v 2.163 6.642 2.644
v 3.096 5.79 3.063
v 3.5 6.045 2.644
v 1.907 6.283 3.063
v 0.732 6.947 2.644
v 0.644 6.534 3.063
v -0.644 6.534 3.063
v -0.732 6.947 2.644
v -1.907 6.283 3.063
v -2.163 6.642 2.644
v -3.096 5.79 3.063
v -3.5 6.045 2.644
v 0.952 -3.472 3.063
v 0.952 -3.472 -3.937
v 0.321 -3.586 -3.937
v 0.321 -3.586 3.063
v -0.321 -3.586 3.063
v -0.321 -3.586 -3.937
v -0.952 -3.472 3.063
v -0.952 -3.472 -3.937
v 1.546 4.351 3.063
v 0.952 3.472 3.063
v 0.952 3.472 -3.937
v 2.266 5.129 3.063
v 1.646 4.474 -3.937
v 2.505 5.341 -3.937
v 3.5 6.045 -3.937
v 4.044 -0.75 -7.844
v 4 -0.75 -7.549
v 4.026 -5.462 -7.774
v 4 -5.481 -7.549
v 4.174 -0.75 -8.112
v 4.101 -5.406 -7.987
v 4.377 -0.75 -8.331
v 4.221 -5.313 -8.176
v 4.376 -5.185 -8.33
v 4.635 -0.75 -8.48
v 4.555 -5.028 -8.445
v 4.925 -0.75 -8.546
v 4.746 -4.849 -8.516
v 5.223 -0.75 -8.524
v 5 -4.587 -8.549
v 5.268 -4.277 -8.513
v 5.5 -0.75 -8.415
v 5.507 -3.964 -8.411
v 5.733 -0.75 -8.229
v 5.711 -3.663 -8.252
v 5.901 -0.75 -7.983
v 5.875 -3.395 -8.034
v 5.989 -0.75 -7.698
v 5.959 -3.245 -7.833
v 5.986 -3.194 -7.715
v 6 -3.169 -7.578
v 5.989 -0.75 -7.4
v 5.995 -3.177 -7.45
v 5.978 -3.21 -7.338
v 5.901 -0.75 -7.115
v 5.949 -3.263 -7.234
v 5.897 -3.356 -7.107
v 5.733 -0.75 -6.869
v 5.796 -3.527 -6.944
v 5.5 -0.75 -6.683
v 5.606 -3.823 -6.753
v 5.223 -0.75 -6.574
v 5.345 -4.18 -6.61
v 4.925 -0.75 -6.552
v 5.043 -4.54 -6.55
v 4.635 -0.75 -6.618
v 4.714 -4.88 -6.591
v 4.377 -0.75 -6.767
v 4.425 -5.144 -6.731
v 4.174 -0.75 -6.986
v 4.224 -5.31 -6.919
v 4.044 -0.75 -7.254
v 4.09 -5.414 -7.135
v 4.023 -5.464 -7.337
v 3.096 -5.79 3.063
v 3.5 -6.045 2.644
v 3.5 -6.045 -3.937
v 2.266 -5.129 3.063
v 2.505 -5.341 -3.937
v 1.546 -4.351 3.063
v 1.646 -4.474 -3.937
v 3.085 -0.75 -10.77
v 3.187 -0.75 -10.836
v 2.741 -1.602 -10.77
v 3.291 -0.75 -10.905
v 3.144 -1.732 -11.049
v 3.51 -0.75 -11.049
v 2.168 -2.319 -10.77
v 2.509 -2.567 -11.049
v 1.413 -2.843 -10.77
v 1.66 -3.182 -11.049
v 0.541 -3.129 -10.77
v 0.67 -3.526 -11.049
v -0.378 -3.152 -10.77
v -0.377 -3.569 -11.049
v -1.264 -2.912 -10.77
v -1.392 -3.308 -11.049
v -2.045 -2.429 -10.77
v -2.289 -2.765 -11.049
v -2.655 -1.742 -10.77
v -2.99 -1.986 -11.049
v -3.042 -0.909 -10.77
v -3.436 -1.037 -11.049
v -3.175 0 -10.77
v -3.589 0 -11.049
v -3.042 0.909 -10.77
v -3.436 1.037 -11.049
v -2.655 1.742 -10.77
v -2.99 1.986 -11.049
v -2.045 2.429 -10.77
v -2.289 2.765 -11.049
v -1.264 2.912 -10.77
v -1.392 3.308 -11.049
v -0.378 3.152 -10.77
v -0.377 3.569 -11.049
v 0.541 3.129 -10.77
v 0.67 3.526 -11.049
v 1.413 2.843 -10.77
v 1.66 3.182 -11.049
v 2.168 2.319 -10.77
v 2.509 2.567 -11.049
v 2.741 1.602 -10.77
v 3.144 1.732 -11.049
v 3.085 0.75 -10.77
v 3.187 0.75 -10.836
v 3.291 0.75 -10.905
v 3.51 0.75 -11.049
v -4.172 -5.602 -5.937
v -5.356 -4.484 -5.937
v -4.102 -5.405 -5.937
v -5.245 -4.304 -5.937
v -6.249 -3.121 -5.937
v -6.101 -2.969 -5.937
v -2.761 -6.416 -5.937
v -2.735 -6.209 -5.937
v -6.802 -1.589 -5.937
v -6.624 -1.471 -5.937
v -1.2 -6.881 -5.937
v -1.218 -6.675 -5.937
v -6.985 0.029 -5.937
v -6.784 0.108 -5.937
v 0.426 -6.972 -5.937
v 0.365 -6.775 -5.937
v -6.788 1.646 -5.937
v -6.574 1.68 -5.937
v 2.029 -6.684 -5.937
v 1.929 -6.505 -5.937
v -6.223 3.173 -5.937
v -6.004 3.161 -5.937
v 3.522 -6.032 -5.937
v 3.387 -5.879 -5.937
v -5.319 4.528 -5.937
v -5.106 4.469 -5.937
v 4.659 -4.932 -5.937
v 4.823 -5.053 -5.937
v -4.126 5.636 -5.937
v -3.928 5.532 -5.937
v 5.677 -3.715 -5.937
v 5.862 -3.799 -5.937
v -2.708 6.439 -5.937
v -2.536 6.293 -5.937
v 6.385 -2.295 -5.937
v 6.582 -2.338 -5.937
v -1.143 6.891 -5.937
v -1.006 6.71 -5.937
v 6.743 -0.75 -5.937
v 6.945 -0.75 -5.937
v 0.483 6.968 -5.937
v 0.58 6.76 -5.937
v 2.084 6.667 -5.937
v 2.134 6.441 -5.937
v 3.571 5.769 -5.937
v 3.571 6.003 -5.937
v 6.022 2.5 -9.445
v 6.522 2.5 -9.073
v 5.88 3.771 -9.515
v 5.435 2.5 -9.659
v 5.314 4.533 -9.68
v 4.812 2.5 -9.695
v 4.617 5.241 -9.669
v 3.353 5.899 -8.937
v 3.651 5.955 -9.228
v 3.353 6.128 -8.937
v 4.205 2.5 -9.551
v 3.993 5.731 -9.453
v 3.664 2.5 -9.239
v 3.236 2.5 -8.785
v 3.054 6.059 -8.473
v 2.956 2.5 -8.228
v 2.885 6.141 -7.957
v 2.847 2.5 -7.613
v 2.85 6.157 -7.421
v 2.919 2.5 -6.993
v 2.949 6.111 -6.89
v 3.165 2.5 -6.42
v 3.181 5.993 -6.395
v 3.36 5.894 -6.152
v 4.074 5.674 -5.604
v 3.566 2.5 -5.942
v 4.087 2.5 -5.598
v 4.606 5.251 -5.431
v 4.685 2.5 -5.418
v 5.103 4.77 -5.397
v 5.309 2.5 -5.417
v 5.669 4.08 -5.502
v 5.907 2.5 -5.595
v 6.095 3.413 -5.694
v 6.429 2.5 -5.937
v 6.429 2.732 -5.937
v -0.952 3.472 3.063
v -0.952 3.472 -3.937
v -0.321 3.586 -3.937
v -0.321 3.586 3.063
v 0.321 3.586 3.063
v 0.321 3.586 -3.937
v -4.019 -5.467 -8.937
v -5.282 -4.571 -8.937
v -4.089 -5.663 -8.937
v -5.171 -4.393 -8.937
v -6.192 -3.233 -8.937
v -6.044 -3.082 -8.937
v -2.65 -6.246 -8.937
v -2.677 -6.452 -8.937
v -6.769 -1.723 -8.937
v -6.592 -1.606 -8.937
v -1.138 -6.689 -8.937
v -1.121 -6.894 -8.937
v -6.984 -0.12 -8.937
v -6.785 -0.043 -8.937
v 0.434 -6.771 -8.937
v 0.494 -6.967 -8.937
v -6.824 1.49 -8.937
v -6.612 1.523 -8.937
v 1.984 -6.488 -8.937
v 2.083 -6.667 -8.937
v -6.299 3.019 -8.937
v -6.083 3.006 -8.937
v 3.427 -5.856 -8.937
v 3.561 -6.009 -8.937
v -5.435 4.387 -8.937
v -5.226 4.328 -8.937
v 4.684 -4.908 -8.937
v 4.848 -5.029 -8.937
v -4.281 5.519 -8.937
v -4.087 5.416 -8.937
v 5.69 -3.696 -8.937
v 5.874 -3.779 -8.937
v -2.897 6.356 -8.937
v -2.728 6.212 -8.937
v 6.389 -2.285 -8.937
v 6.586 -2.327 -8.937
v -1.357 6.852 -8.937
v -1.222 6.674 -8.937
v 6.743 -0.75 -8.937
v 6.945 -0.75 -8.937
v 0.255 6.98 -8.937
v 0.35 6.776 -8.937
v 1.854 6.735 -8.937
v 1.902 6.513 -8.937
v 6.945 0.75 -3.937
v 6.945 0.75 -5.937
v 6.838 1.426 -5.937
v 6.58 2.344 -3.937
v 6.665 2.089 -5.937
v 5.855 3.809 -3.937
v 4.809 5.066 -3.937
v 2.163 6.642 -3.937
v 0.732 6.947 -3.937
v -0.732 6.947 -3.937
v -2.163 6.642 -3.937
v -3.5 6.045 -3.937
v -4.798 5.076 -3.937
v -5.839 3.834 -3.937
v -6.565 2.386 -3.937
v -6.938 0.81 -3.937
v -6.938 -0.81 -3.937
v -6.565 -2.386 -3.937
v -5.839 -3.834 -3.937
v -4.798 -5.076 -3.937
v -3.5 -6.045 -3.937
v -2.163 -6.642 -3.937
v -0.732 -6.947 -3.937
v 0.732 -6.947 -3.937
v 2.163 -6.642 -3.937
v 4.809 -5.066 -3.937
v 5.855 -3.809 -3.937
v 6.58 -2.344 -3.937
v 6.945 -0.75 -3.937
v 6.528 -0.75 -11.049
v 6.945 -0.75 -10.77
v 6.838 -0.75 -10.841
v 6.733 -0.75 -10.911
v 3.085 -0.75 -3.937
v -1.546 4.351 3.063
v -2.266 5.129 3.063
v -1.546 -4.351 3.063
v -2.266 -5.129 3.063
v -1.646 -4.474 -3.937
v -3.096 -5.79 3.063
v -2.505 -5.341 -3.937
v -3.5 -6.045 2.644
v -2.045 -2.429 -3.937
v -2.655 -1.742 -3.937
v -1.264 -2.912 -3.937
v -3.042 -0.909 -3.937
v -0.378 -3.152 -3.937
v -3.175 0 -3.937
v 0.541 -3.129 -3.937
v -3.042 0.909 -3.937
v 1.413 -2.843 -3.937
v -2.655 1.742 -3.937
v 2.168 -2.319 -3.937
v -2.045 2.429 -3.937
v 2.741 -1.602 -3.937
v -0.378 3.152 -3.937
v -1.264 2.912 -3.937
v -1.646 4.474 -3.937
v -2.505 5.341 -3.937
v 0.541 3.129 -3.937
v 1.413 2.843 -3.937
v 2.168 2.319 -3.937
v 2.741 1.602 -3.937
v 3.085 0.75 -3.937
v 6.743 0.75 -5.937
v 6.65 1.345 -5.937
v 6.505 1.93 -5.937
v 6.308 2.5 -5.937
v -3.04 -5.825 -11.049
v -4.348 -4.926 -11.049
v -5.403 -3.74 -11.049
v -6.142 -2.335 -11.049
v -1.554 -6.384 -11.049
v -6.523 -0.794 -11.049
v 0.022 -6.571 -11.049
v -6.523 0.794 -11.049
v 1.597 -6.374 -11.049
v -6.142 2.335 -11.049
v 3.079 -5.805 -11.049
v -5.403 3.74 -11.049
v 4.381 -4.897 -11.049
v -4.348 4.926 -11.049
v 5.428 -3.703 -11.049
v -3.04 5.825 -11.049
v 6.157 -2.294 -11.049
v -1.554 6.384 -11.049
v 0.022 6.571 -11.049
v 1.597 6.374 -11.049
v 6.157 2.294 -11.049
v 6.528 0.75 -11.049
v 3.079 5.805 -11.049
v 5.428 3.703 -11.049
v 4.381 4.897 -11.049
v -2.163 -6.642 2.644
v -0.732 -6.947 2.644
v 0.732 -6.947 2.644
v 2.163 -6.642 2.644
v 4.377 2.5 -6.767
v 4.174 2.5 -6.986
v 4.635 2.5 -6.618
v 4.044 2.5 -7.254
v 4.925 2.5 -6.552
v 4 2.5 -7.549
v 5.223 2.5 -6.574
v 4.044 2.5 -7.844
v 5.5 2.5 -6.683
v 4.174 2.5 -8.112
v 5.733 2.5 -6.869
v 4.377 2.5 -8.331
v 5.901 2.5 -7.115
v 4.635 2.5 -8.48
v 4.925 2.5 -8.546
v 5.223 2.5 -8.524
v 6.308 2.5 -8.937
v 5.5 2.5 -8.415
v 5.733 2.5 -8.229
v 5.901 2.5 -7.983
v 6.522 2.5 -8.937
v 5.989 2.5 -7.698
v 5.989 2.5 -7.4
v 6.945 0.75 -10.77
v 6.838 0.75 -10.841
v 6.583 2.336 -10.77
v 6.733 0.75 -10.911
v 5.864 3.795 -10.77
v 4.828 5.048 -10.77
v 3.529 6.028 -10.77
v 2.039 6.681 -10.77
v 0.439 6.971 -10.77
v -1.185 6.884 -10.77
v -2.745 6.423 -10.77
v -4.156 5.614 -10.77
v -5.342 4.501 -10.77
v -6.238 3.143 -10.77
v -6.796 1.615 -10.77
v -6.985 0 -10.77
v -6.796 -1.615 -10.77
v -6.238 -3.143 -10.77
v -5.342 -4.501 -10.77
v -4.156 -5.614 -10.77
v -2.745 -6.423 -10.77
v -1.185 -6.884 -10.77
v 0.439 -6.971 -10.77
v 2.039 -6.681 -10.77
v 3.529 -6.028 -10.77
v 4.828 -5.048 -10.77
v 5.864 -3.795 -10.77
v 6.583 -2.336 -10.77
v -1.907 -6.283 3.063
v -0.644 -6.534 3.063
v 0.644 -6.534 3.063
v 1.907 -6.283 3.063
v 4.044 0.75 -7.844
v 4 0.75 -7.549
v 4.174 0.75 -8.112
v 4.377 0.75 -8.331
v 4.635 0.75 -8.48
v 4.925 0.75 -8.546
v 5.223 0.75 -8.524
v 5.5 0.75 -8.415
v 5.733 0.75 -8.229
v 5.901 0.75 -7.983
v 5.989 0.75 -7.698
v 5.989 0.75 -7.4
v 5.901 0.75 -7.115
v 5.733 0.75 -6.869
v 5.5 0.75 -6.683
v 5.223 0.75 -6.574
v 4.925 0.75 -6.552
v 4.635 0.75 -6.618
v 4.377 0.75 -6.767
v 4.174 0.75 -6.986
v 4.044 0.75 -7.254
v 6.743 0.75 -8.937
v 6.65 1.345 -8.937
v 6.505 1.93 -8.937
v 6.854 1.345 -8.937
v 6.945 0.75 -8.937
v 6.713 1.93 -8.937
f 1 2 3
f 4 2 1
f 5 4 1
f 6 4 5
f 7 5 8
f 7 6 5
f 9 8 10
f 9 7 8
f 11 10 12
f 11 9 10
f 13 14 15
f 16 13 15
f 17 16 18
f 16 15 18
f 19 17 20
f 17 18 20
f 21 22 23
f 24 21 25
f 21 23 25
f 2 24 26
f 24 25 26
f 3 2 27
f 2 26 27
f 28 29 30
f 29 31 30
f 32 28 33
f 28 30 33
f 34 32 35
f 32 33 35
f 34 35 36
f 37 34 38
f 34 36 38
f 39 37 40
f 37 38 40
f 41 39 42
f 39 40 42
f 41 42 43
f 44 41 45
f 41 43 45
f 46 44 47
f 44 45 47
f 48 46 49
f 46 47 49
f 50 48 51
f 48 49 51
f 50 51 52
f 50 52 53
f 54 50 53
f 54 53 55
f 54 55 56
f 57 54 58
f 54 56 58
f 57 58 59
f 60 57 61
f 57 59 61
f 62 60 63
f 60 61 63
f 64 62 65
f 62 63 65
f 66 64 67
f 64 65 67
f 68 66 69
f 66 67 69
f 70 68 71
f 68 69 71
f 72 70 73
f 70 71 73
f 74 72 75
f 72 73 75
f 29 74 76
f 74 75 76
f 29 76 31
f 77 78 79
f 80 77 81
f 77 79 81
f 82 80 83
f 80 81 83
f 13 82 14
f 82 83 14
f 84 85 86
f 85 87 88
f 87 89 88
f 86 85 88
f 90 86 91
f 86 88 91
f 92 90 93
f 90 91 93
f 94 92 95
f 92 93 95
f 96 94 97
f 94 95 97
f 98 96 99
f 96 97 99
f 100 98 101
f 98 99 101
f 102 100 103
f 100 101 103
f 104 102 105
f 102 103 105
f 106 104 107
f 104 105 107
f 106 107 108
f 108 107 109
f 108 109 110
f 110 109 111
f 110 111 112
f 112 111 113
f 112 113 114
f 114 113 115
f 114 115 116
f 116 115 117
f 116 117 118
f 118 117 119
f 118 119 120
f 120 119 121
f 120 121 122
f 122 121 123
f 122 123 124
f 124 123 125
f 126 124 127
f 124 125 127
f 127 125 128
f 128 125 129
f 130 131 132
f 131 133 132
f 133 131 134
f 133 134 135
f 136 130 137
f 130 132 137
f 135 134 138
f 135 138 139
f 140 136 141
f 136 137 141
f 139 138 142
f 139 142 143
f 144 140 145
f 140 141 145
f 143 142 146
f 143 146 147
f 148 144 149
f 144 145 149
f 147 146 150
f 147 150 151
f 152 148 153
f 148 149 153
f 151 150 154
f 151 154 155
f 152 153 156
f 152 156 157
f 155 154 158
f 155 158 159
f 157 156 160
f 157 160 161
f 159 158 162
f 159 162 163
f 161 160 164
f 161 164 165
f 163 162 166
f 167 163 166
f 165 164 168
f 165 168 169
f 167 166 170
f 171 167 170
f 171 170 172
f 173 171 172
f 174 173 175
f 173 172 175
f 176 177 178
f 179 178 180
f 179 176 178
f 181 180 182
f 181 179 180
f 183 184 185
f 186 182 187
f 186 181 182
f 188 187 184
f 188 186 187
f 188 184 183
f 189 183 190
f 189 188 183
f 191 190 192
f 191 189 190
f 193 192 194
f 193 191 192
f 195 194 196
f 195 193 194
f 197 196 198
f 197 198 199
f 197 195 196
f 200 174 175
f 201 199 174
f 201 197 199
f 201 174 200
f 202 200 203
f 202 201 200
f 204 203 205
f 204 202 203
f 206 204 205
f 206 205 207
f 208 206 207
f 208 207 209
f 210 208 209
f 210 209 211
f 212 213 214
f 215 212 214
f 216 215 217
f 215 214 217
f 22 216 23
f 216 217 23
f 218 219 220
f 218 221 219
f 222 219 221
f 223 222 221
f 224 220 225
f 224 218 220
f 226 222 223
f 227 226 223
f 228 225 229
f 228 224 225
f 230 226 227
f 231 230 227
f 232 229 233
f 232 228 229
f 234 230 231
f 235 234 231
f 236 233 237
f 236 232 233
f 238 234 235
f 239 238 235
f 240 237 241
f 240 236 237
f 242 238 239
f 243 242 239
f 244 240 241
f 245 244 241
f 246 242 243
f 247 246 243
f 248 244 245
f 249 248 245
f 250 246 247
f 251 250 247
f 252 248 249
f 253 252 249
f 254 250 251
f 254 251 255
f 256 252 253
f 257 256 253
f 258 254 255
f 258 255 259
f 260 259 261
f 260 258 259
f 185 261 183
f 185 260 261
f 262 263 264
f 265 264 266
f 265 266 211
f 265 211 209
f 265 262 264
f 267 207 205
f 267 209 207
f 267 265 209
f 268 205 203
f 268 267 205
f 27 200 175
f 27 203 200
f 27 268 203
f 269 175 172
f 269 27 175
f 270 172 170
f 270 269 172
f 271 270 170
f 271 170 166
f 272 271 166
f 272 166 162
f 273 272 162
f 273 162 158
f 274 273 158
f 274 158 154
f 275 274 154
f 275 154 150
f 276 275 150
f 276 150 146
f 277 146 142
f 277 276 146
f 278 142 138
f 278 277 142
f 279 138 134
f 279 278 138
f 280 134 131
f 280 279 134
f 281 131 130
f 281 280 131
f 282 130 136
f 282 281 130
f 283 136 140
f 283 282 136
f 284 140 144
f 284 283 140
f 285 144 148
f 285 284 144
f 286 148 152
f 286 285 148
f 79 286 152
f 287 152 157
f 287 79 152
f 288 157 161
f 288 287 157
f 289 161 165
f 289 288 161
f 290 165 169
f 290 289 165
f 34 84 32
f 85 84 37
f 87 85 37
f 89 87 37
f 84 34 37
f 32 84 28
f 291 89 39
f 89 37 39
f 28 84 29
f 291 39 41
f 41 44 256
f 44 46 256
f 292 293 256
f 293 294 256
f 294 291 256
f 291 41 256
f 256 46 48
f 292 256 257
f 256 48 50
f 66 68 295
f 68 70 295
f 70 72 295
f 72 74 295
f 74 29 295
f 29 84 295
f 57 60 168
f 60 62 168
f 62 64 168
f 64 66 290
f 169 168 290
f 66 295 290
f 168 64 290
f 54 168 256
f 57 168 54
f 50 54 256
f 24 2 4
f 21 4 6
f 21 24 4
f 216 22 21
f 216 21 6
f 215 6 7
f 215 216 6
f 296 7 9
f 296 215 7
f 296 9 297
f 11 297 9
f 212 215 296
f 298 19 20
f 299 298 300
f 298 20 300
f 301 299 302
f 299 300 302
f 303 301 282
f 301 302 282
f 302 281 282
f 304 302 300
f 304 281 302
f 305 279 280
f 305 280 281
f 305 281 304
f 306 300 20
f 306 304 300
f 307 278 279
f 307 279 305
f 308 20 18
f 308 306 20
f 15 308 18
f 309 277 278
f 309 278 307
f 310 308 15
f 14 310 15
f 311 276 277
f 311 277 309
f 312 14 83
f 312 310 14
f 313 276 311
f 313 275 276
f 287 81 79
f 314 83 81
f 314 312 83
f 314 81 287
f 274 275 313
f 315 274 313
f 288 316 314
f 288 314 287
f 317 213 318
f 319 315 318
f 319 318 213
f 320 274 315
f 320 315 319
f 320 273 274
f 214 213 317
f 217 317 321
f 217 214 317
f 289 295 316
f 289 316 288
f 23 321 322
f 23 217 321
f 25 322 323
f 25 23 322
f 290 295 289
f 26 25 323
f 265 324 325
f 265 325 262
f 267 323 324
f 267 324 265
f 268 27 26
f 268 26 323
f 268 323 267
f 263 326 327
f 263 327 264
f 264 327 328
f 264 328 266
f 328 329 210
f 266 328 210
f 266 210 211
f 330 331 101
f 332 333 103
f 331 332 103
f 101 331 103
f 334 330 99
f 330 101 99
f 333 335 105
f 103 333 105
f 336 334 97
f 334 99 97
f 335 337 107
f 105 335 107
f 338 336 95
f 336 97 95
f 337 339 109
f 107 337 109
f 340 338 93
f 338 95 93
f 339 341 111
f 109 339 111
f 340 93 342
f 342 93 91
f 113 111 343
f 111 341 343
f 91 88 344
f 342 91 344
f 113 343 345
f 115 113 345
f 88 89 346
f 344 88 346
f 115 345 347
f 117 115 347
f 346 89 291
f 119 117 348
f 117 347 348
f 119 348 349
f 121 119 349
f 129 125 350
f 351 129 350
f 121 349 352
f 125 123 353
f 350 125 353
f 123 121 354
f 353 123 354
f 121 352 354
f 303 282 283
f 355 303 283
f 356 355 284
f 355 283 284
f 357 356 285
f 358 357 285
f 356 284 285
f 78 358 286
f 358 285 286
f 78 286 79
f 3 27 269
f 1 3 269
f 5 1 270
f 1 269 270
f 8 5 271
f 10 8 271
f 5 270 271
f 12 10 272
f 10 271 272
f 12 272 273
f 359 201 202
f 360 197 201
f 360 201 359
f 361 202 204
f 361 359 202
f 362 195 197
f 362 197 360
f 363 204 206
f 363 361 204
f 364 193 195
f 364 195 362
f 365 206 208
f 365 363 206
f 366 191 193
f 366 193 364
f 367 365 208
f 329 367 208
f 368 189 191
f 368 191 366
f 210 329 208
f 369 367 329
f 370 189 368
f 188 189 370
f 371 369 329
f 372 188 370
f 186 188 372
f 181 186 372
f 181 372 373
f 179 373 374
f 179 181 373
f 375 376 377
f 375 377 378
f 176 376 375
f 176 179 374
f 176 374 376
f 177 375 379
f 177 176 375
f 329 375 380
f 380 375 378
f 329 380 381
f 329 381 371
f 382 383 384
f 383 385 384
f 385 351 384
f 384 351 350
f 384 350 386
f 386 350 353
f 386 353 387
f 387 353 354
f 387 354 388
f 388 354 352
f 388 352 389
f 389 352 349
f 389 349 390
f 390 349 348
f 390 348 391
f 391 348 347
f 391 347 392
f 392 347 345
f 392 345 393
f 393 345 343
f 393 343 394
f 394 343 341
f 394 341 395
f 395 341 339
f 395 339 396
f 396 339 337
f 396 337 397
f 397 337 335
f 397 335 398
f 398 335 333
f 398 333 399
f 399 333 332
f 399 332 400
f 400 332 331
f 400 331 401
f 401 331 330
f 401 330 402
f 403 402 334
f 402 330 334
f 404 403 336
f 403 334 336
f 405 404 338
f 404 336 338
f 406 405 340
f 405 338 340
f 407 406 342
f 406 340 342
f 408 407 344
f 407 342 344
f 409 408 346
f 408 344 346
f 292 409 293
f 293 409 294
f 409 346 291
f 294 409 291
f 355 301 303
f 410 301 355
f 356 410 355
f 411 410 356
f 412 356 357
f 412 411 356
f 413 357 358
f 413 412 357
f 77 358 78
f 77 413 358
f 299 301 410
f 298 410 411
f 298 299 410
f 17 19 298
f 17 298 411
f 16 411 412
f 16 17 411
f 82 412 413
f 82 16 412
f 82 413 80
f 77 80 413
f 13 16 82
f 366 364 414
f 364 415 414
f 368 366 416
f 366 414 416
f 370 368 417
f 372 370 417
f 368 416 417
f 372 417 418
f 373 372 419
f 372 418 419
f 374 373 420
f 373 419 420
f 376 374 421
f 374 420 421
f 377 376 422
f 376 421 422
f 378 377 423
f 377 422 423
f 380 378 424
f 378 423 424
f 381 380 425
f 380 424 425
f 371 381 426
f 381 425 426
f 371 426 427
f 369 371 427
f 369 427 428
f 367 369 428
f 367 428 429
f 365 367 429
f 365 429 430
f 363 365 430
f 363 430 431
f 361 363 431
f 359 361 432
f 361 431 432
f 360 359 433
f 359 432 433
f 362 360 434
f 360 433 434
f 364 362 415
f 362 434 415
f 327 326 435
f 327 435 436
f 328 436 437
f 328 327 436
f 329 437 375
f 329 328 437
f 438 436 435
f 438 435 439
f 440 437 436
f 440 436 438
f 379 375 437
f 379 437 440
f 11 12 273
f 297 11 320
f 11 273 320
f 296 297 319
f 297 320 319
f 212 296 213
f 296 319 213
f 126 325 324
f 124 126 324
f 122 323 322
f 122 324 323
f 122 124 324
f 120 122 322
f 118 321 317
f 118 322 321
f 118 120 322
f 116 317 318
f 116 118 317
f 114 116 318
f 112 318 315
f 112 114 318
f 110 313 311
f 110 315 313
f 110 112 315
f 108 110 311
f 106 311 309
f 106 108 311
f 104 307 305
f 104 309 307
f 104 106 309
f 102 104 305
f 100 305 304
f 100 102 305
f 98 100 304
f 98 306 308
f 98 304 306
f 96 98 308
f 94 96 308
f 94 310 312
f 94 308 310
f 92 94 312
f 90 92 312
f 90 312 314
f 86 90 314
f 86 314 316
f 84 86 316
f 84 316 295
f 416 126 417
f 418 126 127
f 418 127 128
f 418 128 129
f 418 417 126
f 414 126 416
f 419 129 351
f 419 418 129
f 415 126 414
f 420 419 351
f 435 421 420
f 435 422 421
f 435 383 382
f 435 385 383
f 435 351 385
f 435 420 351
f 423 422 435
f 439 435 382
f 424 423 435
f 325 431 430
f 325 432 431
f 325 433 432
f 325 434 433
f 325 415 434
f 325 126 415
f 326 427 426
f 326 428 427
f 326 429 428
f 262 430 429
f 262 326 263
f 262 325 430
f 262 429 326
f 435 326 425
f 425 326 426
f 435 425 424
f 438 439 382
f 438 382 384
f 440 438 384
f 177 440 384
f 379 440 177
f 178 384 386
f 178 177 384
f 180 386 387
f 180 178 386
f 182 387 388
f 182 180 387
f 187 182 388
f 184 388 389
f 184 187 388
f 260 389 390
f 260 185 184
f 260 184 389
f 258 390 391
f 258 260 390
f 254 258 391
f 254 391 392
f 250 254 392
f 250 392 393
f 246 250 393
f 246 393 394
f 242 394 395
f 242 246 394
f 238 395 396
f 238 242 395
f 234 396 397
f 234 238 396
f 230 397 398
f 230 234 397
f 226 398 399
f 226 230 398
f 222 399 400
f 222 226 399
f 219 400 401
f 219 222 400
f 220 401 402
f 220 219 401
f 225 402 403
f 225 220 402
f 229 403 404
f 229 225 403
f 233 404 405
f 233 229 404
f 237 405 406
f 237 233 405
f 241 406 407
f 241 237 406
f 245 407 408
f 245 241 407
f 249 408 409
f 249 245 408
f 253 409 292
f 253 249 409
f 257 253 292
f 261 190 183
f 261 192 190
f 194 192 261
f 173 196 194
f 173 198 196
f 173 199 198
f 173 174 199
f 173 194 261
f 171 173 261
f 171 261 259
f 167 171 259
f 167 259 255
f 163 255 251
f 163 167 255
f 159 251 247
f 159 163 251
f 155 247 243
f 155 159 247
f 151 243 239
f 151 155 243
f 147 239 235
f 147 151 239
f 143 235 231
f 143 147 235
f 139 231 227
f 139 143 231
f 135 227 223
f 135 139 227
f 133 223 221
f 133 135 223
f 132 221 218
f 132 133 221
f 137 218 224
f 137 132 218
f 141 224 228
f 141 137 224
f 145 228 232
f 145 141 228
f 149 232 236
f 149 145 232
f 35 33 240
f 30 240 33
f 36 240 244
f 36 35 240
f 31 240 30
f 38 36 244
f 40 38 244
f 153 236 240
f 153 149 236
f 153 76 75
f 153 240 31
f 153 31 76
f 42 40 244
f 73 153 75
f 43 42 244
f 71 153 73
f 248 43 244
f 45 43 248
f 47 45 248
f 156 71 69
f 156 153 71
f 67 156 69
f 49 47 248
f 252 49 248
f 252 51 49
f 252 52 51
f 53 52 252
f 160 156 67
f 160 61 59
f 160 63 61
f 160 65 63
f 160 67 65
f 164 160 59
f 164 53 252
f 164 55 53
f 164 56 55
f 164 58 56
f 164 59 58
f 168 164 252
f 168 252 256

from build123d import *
from OCP.BRepFilletAPI import BRepFilletAPI_MakeChamfer

# Parameters (mm, degrees)
BOSS_EXTRUDE1_START     = -3.937
SKETCH1_R               = 6.985
BOSS_EXTRUDE1_DEPTH     = 7.112
CUT_EXTRUDE10_START     = -2
SKETCH25_R              = 6.985
SKETCH25_R_2            = 6.785
CUT_EXTRUDE10_DEPTH     = 3
BOSS_EXTRUDE2_DEPTH     = 7
CIRPATTERN1_COUNT       = 2
CUT_EXTRUDE5_DEPTH      = 15.820959854
CUT_EXTRUDE5_DEPTH_BACK = 15.820959854
SKETCH15_R              = 3.175
CHAMFER1_SIZE           = 0.2794
CHAMFER1_SIZE2          = 0.414227535
SKETCH19_R              = 2.154
CUT_EXTRUDE6_DEPTH      = 17.15041344
SKETCH23_W              = 6.985
SKETCH23_H              = 1.5
CUT_EXTRUDE9_DEPTH      = 15.820959948
CHAMFER6_SIZE           = 0.4191


with BuildPart() as part:
    # Sketch1 → Boss-Extrude1 (new body)
    with BuildSketch(Plane.XY.offset(BOSS_EXTRUDE1_START)):
        Circle(SKETCH1_R)
    extrude(amount=-BOSS_EXTRUDE1_DEPTH)

    # Sketch25 → Cut-Extrude10 (cut)
    with BuildSketch(Plane.XY.offset(-3.937).offset(CUT_EXTRUDE10_START)):
        Circle(SKETCH25_R)
        Circle(SKETCH25_R_2, mode=Mode.SUBTRACT)
    extrude(amount=-CUT_EXTRUDE10_DEPTH, mode=Mode.SUBTRACT)

    # Sketch2 → Boss-Extrude2 (add)
    with BuildSketch(Plane.XY.offset(-3.937)):
        with BuildLine():
            ThreePointArc((-3.5, -6.044851115), (0, -6.985), (3.5, -6.044851115))
            ThreePointArc((3.5, -6.044851115), (2.056519165, -4.92606064), (0.951562077, -3.471963366))
            ThreePointArc((0.951562077, -3.471963366), (0, -3.6), (-0.951562077, -3.471963366))
            ThreePointArc((-0.951562077, -3.471963366), (-2.056519165, -4.92606064), (-3.5, -6.044851115))
        make_face()
    boss_extrude2 = extrude(amount=BOSS_EXTRUDE2_DEPTH)

    # CirPattern1: Boss-Extrude2 ×2 about axis
    cirpattern1_axis = Axis((0, 0, 0), (0, 0, 1))
    for i in range(1, CIRPATTERN1_COUNT):
        add(boss_extrude2.rotate(cirpattern1_axis, i * 360 / CIRPATTERN1_COUNT))

    # Sketch15 → Cut-Extrude5 (cut, two sides: drawn at the far end of the back side and taken through both)
    with BuildSketch(Plane.XY.offset(-CUT_EXTRUDE5_DEPTH_BACK)):
        Circle(SKETCH15_R)
    extrude(amount=CUT_EXTRUDE5_DEPTH + CUT_EXTRUDE5_DEPTH_BACK, mode=Mode.SUBTRACT)

    # Chamfer1: one chamfer whose edges measure the first distance from different faces: ONE call of the kernel's chamfer builder (chamfer() names one face for all edges)
    chamfer1_edges_1 = [part.edges().sort_by_distance(p)[0] for p in [
        (-3.175, 0, -11.049),
    ]]
    chamfer1_side_1 = [part.faces().sort_by_distance(p)[0] for p in [
        (-3.175, 0, -7.493),
    ]]
    chamfer1_edges_2 = [part.edges().sort_by_distance(p)[0] for p in [
        (-6.985, 0, -11.049),
    ]]
    chamfer1_side_2 = [part.faces().sort_by_distance(p)[0] for p in [
        (-6.985, 0, -9.993),
    ]]
    chamfer1 = BRepFilletAPI_MakeChamfer(part.part.solid().wrapped)
    for e in chamfer1_edges_1:
        chamfer1.Add(CHAMFER1_SIZE, CHAMFER1_SIZE2, e.wrapped, chamfer1_side_1[0].wrapped)  # the first distance lies on this face
    for e in chamfer1_edges_2:
        chamfer1.Add(CHAMFER1_SIZE, CHAMFER1_SIZE2, e.wrapped, chamfer1_side_2[0].wrapped)  # the first distance lies on this face
    add(Compound.cast(chamfer1.Shape()), mode=Mode.REPLACE)

    # Sketch17 → Cut-Revolve1 (revolve, cut)
    with BuildSketch(Plane(origin=(0, 0, -7.549), x_dir=(-1, 0, 0), z_dir=(0, 0, -1)), mode=Mode.PRIVATE) as cut_revolve1_sk:
        Polygon((-6, 2.5), (-6, -7.201139233), (-5, -7.201139233), (-5, 4.499600677), (-5, 8.2375), (-6.9, 8.2375), (-6.9, 4.499600677), (-6.9, 2.5), align=None)
    revolve(cut_revolve1_sk.sketch.rotate(Axis((5, 4.499600677, -7.549), (0, -1, 0)), 180), axis=Axis((5, 4.499600677, -7.549), (0, -1, 0)), mode=Mode.SUBTRACT)

    # Sketch19 → Cut-Extrude6 (cut, through all)
    with BuildSketch(Plane(origin=(0, 2.5, 0), x_dir=(1, 0, 0), z_dir=(0, 1, 0))):
        with Locations((5, 7.549)):
            Circle(SKETCH19_R)
    extrude(amount=CUT_EXTRUDE6_DEPTH, mode=Mode.SUBTRACT)

    # Sketch23 → Cut-Extrude9 (cut, through all)
    with BuildSketch(Plane.XY):
        with Locations((3.4925, 0)):
            Rectangle(SKETCH23_W, SKETCH23_H)
    extrude(amount=-CUT_EXTRUDE9_DEPTH, mode=Mode.SUBTRACT)

    # Chamfer6
    chamfer6_edges = [part.edges().sort_by_distance(p)[0] for p in [
        (0, -6.985, 3.063),
        (0, 6.985, 3.063),
    ]]
    chamfer(chamfer6_edges, length=CHAMFER6_SIZE)


solid = part.part
